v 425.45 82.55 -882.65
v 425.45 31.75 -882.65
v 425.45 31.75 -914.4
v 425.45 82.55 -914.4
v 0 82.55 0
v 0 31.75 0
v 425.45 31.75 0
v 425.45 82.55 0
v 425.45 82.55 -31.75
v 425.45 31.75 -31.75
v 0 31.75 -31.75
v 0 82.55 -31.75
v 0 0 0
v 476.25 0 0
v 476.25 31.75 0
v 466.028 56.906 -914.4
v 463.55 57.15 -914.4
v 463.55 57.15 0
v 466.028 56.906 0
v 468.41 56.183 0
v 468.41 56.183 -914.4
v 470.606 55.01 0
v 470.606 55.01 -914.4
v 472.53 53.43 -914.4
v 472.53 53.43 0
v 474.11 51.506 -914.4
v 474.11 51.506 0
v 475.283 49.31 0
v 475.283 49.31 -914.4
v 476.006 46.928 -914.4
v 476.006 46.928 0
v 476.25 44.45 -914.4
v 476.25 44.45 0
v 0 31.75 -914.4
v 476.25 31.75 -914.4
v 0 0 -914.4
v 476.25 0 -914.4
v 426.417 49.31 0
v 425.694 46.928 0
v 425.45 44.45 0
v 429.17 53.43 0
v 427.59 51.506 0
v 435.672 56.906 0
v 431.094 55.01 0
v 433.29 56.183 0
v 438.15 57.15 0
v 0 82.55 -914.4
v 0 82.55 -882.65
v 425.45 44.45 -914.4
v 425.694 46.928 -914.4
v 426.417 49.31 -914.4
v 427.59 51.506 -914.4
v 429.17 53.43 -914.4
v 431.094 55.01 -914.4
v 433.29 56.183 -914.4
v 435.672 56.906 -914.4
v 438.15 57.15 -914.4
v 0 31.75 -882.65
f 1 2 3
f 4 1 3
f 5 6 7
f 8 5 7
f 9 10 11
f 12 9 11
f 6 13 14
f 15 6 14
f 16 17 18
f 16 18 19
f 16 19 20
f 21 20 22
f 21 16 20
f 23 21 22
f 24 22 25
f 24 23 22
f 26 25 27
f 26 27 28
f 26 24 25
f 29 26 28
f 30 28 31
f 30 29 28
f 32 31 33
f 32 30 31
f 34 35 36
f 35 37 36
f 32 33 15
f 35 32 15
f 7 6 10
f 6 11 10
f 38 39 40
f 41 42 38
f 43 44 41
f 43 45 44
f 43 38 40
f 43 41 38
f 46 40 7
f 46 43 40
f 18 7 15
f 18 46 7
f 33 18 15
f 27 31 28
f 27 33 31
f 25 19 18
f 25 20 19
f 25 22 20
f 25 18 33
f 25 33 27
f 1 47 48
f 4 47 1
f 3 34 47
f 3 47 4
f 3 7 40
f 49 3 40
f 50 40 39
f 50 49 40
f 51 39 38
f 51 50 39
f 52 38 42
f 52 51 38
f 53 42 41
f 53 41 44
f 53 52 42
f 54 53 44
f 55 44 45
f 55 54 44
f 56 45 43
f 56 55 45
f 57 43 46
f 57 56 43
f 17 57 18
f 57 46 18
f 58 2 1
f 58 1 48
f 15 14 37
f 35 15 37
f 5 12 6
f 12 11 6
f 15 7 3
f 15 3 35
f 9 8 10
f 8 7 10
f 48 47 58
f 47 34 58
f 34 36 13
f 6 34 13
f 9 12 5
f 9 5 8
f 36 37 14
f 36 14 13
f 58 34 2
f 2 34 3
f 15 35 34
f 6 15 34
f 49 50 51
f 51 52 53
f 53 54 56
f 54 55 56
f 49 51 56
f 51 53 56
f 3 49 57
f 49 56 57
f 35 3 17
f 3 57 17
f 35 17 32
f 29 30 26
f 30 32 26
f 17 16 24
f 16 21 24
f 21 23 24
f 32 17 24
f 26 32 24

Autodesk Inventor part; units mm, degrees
ref_plane "YZ Plane" through (0, 0, 0) normal (1, 0, 0) x (0, 1, 0)
ref_plane "XZ Plane" through (0, 0, 0) normal (0, 1, 0) x (-1, 0, 0)
ref_plane "XY Plane" through (0, 0, 0) normal (0, 0, 1) x (1, 0, 0)
sketch "Sketch1" plane through (0, 0, 0) normal (0, 1, 0) x (-1, 0, 0)
  line L0 (0, 0) -> (-476.25, 0)
  line L1 (-476.25, 0) -> (-476.25, -914.4)
  line L2 (-476.25, -914.4) -> (0, -914.4)
  line L3 (0, -914.4) -> (0, 0)
  dimension "d0" = 476.25
  dimension "d1" = 914.4
extrude "Extrusion1" add sketch "Sketch1" along normal blind 31.75
sketch "Sketch2" plane through (0, 0, 0) normal (0, 0, 1) x (1, 0, 0)
  line L0 (0, 31.75) -> (476.25, 31.75) projected
  line L1 (476.25, 0) -> (476.25, 31.75) projected
  line L2 (0, 0) -> (476.25, 0) projected
  line L3 (476.25, 0) -> (476.25, 31.75) projected
  line L4 (0, 31.75) -> (476.25, 31.75) projected
  line L5 (0, 0) -> (0, 31.75) projected
  line L6 (476.25, 31.75) -> (0, 31.75) projected
  line L7 (476.25, 31.75) -> (425.45, 31.75)
  line L8 (425.45, 31.75) -> (425.45, 57.15)
  line L9 (425.45, 57.15) -> (476.25, 57.15)
  line L10 (476.25, 57.15) -> (476.25, 31.75)
  dimension "d4" = 50.8
  dimension "d5" = 25.4
extrude "Extrusion2" add sketch "Sketch2" against normal up to surface (914.4 mm away) separate body contours L8 L9 L10 L0
fillet "Fillet1" radius 12.7 2 edges at (476.25, 57.15, -457.2) (425.45, 57.15, -457.2)
sketch "Sketch3" plane through (0, 31.75, 0) normal (0, 1, 0) x (1, 0, 0)
  line L0 (0, 914.4) -> (0, 0) projected
  line L1 (425.45, 0) -> (425.45, 914.4) projected
  line L2 (0, 0) -> (425.45, 0)
  line L3 (425.45, 0) -> (425.45, 31.75)
  line L4 (425.45, 31.75) -> (0, 31.75)
  line L5 (0, 31.75) -> (0, 0)
  line L6 (0, 914.4) -> (425.45, 914.4)
  line L7 (425.45, 914.4) -> (425.45, 882.65)
  line L8 (425.45, 882.65) -> (0, 882.65)
  line L9 (0, 882.65) -> (0, 914.4)
  point P0 (0, 31.75)
  dimension "d9" = 31.75
  dimension "d10" = 31.75
extrude "Extrusion3" add sketch "Sketch3" along normal blind 50.8 separate body contours L6 L1 L8 L0 | L4 L1 L2 L0
properties part number "Drawer" material "Wood (Birch)"
